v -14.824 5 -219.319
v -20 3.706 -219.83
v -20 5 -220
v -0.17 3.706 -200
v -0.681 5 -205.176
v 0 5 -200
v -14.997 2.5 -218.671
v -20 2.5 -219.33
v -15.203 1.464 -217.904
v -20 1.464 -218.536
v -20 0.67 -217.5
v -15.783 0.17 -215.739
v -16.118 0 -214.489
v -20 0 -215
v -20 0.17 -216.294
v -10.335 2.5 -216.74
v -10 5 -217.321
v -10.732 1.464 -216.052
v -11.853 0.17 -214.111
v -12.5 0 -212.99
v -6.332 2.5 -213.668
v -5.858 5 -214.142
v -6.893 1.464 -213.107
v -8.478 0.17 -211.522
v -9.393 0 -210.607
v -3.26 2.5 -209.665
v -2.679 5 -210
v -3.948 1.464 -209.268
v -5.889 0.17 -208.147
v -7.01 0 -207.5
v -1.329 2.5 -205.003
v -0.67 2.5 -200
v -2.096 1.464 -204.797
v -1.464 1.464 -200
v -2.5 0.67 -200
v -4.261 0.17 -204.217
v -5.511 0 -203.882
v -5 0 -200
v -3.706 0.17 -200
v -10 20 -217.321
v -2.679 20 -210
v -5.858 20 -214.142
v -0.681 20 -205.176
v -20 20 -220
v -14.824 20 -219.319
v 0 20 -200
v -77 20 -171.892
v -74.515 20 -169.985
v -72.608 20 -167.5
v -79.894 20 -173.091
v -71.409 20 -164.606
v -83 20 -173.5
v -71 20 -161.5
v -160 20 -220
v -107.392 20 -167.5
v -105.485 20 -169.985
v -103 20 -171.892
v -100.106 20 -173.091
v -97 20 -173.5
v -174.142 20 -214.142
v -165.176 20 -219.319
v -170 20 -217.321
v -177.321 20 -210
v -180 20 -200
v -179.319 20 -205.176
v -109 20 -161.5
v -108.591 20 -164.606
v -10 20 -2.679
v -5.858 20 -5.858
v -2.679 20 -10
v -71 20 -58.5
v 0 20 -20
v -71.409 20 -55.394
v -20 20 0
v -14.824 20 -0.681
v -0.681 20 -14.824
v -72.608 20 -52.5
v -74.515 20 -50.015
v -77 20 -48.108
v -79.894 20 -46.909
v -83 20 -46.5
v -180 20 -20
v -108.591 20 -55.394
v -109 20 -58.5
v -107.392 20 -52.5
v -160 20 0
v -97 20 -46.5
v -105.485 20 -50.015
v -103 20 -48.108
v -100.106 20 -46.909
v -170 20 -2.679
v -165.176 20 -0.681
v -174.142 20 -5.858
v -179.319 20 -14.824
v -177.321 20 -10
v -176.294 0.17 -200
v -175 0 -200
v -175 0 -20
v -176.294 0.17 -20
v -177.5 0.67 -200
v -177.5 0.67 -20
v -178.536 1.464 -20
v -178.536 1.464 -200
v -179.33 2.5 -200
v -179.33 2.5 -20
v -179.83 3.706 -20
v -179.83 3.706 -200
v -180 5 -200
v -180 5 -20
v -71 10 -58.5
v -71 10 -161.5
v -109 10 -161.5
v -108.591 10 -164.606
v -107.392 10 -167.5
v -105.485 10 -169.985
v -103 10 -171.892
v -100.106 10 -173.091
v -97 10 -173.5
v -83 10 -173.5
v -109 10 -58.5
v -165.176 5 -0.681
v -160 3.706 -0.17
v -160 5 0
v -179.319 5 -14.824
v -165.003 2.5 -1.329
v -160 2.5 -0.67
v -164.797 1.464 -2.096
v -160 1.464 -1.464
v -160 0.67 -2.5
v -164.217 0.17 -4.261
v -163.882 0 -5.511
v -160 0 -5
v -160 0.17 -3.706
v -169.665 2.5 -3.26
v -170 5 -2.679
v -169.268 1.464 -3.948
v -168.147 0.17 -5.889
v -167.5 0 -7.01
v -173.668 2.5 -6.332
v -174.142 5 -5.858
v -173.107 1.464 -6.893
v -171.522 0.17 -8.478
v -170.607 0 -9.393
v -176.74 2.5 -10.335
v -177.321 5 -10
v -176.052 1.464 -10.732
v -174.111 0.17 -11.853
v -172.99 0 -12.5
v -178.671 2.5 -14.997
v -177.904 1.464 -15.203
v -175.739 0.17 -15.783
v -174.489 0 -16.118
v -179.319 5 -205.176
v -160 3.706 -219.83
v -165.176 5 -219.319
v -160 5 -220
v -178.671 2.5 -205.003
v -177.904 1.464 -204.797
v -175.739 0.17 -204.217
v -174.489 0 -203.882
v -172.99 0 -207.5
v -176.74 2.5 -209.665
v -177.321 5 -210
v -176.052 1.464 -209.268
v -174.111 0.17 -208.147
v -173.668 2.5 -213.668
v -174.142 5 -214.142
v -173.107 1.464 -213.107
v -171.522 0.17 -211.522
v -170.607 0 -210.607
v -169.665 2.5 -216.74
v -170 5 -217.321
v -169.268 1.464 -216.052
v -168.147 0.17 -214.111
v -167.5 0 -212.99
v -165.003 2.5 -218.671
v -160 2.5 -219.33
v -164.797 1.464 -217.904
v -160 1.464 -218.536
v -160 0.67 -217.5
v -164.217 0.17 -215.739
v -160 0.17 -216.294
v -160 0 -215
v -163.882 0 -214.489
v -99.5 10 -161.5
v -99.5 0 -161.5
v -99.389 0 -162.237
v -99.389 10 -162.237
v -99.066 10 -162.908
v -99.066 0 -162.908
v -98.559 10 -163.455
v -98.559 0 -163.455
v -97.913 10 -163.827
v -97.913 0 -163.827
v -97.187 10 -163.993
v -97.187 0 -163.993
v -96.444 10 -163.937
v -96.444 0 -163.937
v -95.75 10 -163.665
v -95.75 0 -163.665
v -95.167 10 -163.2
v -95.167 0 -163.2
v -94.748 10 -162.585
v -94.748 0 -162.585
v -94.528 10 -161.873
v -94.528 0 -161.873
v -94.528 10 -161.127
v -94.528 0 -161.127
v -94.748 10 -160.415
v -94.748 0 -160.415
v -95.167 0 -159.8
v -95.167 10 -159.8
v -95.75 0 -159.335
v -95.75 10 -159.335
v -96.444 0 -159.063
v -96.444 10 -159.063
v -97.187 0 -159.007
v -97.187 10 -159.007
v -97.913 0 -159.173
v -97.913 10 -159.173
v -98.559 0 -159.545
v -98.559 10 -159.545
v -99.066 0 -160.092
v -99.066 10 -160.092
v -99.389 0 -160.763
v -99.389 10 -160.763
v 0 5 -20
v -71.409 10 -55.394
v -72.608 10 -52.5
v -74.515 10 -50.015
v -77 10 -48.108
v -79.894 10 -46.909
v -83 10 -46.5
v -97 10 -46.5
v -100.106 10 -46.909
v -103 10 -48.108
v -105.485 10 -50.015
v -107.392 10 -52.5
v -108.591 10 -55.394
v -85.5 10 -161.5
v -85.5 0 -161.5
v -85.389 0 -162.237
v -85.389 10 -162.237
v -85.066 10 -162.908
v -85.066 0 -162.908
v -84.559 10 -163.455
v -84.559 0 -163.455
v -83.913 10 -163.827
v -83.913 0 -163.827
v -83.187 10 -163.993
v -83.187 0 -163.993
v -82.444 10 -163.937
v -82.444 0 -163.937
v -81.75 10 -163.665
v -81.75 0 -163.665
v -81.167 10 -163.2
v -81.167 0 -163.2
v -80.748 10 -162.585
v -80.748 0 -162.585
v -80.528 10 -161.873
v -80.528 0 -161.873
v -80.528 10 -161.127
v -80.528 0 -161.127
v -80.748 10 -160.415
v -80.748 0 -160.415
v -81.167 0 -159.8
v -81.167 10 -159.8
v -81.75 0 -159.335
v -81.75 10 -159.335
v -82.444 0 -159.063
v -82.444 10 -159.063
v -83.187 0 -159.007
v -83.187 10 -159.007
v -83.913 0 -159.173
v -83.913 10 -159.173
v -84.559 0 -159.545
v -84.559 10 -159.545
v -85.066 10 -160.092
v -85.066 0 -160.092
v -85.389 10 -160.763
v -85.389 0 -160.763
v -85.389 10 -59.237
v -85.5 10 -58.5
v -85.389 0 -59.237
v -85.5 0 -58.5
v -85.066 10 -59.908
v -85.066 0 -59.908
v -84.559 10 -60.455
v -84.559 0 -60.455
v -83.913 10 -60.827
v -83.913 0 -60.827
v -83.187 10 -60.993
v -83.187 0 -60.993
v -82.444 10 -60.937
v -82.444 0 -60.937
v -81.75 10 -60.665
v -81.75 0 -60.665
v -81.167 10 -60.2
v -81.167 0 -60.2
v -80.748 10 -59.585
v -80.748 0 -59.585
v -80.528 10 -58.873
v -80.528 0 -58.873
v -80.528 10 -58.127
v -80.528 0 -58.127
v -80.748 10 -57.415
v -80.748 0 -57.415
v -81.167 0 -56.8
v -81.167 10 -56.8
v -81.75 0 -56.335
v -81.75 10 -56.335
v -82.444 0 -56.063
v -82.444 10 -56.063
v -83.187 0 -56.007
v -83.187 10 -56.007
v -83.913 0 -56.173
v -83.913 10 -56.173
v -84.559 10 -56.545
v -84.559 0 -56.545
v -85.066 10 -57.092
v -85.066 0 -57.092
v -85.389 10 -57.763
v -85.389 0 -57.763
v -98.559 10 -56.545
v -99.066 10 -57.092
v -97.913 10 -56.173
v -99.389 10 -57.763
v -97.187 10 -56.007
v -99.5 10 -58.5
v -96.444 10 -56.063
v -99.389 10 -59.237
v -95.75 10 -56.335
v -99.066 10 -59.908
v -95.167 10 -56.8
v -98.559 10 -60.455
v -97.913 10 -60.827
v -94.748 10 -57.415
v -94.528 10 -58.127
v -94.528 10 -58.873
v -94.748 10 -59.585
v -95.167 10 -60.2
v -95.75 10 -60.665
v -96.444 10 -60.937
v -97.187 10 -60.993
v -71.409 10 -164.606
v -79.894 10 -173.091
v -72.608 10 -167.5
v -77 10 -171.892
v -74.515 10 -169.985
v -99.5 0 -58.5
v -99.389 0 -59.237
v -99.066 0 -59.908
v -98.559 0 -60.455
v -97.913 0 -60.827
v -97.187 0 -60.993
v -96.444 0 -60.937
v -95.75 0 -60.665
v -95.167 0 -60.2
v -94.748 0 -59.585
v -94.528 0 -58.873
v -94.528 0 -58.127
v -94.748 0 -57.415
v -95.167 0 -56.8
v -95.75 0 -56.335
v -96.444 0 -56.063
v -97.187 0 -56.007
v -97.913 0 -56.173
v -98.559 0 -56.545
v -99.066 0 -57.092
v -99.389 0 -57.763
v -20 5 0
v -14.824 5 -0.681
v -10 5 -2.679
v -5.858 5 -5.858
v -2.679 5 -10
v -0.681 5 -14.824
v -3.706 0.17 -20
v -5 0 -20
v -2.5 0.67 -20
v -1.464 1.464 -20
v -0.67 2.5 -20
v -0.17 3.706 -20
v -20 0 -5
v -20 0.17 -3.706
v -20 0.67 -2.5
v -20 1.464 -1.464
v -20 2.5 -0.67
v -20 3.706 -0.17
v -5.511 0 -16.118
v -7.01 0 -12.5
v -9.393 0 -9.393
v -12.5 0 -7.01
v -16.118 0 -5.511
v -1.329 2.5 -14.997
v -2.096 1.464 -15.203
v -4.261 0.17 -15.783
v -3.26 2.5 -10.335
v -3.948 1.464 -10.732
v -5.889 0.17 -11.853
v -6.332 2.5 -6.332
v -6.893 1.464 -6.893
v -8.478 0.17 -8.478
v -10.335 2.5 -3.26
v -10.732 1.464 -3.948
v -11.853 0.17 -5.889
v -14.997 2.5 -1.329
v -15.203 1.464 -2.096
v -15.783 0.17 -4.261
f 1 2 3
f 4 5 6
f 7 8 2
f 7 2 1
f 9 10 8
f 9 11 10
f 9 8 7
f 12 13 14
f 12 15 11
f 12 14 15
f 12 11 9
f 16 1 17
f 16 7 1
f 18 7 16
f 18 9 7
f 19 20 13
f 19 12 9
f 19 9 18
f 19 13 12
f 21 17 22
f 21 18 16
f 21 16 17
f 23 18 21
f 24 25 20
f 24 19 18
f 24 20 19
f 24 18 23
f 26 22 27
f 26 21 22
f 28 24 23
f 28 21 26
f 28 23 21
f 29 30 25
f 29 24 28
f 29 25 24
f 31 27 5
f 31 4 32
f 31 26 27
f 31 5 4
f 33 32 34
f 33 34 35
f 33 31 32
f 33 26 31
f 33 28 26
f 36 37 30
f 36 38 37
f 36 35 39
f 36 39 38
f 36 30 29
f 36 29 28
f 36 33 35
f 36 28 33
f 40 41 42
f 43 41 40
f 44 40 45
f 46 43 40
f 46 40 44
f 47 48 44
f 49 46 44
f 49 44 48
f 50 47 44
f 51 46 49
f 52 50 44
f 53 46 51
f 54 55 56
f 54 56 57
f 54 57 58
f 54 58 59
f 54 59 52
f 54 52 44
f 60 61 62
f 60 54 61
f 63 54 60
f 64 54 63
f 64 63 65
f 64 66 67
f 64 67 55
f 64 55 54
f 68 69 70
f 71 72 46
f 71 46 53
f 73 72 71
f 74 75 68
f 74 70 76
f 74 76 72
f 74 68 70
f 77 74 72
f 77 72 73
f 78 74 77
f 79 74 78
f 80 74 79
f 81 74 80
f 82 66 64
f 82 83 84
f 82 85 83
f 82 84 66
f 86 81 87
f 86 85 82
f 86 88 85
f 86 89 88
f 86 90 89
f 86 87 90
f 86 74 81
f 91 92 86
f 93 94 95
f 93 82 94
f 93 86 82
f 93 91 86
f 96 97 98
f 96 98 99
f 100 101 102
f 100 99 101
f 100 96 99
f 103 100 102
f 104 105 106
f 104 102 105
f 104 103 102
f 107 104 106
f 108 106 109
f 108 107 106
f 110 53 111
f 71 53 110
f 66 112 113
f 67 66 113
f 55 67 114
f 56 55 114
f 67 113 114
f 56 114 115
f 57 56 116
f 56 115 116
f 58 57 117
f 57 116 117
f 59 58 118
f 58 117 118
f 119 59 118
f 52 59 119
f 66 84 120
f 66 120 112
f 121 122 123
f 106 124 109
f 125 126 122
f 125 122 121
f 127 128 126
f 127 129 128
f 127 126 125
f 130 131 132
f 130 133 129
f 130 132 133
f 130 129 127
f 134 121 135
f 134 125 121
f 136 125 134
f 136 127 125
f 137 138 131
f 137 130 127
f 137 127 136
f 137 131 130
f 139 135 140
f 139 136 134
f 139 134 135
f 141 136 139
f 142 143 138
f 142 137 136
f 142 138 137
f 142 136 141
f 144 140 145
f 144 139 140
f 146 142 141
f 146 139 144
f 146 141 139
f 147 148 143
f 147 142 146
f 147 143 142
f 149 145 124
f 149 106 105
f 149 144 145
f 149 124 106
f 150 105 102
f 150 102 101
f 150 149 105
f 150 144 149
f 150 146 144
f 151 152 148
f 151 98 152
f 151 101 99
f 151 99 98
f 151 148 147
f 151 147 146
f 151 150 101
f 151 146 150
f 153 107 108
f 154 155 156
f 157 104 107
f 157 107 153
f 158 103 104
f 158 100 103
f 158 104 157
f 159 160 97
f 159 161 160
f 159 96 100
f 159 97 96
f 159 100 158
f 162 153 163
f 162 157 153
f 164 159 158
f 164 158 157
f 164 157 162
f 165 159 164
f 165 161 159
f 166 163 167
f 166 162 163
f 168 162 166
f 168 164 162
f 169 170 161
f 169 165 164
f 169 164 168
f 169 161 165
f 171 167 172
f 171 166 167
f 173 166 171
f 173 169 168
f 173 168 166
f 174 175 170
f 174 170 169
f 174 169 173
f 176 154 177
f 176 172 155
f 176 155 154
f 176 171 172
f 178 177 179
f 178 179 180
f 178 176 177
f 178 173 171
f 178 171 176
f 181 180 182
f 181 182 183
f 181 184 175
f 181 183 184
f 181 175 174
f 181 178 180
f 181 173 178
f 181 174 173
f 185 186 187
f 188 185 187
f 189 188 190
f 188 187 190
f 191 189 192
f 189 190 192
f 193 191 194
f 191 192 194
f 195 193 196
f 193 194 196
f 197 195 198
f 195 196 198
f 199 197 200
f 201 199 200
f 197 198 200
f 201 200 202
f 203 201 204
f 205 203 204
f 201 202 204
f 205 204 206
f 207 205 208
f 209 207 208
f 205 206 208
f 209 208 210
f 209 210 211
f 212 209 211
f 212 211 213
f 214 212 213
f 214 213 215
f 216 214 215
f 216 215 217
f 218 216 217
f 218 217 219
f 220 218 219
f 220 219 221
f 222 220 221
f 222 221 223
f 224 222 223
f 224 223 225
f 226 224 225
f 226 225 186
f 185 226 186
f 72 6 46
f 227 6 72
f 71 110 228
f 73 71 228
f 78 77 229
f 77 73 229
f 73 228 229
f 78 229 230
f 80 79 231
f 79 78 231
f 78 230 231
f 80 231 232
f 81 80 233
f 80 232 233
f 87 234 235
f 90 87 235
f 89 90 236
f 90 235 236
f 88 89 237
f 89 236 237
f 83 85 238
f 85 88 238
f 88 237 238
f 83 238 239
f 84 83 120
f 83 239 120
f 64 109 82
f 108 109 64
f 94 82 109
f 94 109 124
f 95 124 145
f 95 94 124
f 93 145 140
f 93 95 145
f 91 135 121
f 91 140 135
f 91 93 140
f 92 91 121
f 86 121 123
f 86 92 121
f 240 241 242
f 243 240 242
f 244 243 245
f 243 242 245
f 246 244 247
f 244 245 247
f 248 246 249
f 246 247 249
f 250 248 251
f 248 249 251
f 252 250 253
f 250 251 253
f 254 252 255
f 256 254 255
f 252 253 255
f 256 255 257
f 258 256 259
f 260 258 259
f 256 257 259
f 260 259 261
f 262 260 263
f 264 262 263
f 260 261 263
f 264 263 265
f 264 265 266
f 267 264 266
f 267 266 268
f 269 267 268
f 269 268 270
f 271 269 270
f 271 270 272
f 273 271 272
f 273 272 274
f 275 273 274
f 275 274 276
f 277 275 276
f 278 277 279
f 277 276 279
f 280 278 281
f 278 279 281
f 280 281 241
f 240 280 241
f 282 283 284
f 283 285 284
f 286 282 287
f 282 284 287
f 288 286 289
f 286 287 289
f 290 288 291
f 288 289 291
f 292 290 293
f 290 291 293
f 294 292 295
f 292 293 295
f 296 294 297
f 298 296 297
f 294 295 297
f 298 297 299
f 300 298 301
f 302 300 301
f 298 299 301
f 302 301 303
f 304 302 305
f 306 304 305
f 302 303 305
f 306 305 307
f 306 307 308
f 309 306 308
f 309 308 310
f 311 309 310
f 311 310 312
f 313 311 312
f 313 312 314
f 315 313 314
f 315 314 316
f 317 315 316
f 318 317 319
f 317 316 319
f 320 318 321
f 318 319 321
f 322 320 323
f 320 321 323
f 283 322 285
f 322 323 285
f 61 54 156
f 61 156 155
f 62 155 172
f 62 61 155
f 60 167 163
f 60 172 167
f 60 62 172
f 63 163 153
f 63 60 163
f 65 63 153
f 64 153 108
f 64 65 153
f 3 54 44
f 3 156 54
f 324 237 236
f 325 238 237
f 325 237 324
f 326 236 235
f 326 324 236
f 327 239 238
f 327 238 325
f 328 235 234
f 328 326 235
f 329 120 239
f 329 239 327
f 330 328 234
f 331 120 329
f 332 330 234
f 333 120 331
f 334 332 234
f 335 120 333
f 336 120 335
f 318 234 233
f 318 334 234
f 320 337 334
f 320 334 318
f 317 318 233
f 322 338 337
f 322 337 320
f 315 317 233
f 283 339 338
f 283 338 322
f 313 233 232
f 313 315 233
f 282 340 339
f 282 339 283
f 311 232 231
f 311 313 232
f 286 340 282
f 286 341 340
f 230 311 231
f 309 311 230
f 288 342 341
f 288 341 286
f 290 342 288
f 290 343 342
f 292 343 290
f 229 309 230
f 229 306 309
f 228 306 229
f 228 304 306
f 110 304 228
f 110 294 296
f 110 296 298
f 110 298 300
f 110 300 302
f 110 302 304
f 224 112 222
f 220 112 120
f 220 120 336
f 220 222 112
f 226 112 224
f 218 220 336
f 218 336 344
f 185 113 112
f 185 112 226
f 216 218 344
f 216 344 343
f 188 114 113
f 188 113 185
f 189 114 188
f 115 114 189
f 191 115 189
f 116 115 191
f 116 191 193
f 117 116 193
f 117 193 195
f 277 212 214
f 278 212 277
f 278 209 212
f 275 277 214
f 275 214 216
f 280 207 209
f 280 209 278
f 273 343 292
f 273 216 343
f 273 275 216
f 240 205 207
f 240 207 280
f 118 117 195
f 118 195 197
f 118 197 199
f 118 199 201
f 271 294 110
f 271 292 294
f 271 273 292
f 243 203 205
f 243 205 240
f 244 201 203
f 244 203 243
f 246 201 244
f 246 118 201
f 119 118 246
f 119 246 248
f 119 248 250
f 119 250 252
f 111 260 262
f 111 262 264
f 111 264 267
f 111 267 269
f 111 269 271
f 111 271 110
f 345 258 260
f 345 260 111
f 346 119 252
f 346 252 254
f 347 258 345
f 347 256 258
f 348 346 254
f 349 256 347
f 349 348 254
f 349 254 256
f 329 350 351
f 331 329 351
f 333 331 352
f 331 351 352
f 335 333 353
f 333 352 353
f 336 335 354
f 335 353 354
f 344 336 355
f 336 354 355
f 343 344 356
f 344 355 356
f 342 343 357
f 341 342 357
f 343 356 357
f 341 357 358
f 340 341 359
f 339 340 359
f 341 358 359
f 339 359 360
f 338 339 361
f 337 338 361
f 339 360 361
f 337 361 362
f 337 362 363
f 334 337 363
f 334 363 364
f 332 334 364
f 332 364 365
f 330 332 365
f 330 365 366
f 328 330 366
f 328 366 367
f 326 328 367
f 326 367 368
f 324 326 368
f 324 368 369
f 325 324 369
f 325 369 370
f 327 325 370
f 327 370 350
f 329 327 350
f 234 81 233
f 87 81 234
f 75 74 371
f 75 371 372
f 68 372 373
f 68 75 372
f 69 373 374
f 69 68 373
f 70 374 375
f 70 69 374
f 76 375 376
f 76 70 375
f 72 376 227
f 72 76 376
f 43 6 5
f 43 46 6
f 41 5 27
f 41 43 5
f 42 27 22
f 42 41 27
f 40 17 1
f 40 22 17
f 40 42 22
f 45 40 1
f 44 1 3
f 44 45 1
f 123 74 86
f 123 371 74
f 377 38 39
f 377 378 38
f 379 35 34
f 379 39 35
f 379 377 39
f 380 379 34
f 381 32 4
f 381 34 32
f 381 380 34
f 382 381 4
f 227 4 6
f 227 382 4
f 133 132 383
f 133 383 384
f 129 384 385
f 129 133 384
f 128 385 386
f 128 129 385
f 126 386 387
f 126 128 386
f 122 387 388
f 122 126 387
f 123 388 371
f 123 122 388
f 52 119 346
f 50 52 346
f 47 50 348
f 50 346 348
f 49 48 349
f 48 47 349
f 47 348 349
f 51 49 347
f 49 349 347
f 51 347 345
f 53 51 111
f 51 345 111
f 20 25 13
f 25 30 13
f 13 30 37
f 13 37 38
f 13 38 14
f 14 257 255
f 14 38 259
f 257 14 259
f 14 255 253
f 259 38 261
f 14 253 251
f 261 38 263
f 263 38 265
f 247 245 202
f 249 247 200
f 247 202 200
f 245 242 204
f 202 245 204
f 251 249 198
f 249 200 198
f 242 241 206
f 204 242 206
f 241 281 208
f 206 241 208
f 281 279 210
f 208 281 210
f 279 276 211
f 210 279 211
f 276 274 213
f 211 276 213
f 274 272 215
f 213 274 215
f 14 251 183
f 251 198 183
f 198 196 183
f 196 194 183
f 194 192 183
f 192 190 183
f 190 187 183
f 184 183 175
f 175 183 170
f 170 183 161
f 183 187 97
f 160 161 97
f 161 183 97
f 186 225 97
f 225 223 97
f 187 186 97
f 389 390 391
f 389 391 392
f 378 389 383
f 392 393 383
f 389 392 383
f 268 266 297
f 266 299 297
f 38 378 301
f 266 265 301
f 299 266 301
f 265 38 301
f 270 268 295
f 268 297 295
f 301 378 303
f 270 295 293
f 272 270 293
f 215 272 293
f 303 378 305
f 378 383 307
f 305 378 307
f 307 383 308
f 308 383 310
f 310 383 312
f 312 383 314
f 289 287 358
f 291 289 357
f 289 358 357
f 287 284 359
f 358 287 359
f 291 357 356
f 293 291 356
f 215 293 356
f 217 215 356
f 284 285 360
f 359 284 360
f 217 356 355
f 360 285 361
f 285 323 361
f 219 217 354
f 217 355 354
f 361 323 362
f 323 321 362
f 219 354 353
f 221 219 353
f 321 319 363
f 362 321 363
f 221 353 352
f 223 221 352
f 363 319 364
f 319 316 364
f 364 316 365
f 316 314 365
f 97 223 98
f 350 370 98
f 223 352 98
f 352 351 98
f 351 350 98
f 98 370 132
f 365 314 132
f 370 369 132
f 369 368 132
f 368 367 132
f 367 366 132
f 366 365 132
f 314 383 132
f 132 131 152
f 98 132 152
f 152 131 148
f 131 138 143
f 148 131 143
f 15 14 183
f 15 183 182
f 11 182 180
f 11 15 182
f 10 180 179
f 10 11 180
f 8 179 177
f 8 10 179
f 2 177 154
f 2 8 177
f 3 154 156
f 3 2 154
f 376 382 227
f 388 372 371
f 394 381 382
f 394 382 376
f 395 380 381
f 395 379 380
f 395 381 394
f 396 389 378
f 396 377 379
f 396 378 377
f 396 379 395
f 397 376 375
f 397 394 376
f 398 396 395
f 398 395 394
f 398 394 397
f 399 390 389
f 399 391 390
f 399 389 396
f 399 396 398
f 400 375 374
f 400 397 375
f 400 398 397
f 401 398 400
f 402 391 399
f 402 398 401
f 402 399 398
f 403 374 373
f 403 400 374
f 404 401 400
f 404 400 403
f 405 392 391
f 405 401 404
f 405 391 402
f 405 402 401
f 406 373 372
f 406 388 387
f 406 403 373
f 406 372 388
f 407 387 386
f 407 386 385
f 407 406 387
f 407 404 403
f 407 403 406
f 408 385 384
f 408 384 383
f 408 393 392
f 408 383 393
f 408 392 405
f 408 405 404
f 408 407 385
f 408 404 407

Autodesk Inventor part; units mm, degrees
ref_plane "YZ Plane" through (0, 0, 0) normal (1, 0, 0) x (0, 1, 0)
ref_plane "XZ Plane" through (0, 0, 0) normal (0, 1, 0) x (-1, 0, 0)
ref_plane "XY Plane" through (0, 0, 0) normal (0, 0, 1) x (1, 0, 0)
sketch "Sketch1" plane through (0, 0, 0) normal (0, 1, 0) x (-1, 0, 0)
  line L0 (0, 0) -> (180, 0)
  line L1 (180, 0) -> (180, -220)
  line L2 (180, -220) -> (0, -220)
  line L3 (0, -220) -> (0, 0)
  line L4 (90, 0) -> (90, -220) construction
  line L5 (90, -110) -> (90, -161.5) construction
  line L6 (90, -110) -> (90, -58.5) construction
  line L7 (90, -161.5) -> (83, -161.5) construction
  line L8 (83, -161.5) -> (83, -193.1088) construction
  circle A0 centre (83, -161.5) radius 2.5
  line L9 (90, -161.5) -> (97, -161.5) construction
  circle A1 centre (97, -161.5) radius 2.5
  line L10 (90, -58.5) -> (83, -58.5) construction
  line L11 (83, -58.5) -> (83, 21.6306) construction
  circle A2 centre (83, -58.5) radius 2.5
  line L12 (90, -58.5) -> (97, -58.5) construction
  circle A3 centre (97, -58.5) radius 2.5 construction
  circle A4 centre (97, -58.5) radius 2.5
  dimension "d0" = 180
  dimension "d1" = 220
  dimension "d2" = 51.5
  dimension "d3" = 51.5
  dimension "d4" = 7
  dimension "d5" = 5
  dimension "d6" = 7
  dimension "d7" = 5
  dimension "d8" = 7
  dimension "d9" = 5
  dimension "d10" = 7
  dimension "d11" = 5
  dimension "d12" = 5
extrude "Extrusion1" add sketch "Sketch1" along normal blind 20
fillet "Fillet1" radius 20 4 edges at (0, 10, -220) (0, 10, 0) (-180, 10, -220) (-180, 10, 0)
sketch "Sketch2" plane through (0, 20, 0) normal (0, 1, 0) x (1, 0, 0)
  line L0 (-109, 173.5) -> (-71, 173.5)
  line L1 (-71, 173.5) -> (-71, 46.5)
  line L2 (-71, 46.5) -> (-109, 46.5)
  line L3 (-109, 46.5) -> (-109, 173.5)
  line L4 (0, 20) -> (0, 200) projected
  line L5 (-20, 220) -> (-160, 220) projected
  point P0 (0, 0)
  point P1 (-71, 110)
  point P2 (0, 110)
  point P3 (-90, 173.5)
  point P4 (-90, 220)
  dimension "d16" = 38
  dimension "d17" = 127
extrude "Extrusion2" cut sketch "Sketch2" against normal blind 10
fillet "Fillet2" radius 12 4 edges at (-109, 15, -173.5) (-71, 15, -173.5) (-109, 15, -46.5) (-71, 15, -46.5)
fillet "Fillet4" radius 5 8 edges at (-174.1421, 0, -214.1421) (-90, 0, -220) (-5.8579, 0, -214.1421) (0, 0, -110) (-5.8579, 0, -5.8579) (-90, 0, 0) (-174.1421, 0, -5.8579) (-180, 0, -110)
properties part number "Stand" material "Wood (Oak)"
